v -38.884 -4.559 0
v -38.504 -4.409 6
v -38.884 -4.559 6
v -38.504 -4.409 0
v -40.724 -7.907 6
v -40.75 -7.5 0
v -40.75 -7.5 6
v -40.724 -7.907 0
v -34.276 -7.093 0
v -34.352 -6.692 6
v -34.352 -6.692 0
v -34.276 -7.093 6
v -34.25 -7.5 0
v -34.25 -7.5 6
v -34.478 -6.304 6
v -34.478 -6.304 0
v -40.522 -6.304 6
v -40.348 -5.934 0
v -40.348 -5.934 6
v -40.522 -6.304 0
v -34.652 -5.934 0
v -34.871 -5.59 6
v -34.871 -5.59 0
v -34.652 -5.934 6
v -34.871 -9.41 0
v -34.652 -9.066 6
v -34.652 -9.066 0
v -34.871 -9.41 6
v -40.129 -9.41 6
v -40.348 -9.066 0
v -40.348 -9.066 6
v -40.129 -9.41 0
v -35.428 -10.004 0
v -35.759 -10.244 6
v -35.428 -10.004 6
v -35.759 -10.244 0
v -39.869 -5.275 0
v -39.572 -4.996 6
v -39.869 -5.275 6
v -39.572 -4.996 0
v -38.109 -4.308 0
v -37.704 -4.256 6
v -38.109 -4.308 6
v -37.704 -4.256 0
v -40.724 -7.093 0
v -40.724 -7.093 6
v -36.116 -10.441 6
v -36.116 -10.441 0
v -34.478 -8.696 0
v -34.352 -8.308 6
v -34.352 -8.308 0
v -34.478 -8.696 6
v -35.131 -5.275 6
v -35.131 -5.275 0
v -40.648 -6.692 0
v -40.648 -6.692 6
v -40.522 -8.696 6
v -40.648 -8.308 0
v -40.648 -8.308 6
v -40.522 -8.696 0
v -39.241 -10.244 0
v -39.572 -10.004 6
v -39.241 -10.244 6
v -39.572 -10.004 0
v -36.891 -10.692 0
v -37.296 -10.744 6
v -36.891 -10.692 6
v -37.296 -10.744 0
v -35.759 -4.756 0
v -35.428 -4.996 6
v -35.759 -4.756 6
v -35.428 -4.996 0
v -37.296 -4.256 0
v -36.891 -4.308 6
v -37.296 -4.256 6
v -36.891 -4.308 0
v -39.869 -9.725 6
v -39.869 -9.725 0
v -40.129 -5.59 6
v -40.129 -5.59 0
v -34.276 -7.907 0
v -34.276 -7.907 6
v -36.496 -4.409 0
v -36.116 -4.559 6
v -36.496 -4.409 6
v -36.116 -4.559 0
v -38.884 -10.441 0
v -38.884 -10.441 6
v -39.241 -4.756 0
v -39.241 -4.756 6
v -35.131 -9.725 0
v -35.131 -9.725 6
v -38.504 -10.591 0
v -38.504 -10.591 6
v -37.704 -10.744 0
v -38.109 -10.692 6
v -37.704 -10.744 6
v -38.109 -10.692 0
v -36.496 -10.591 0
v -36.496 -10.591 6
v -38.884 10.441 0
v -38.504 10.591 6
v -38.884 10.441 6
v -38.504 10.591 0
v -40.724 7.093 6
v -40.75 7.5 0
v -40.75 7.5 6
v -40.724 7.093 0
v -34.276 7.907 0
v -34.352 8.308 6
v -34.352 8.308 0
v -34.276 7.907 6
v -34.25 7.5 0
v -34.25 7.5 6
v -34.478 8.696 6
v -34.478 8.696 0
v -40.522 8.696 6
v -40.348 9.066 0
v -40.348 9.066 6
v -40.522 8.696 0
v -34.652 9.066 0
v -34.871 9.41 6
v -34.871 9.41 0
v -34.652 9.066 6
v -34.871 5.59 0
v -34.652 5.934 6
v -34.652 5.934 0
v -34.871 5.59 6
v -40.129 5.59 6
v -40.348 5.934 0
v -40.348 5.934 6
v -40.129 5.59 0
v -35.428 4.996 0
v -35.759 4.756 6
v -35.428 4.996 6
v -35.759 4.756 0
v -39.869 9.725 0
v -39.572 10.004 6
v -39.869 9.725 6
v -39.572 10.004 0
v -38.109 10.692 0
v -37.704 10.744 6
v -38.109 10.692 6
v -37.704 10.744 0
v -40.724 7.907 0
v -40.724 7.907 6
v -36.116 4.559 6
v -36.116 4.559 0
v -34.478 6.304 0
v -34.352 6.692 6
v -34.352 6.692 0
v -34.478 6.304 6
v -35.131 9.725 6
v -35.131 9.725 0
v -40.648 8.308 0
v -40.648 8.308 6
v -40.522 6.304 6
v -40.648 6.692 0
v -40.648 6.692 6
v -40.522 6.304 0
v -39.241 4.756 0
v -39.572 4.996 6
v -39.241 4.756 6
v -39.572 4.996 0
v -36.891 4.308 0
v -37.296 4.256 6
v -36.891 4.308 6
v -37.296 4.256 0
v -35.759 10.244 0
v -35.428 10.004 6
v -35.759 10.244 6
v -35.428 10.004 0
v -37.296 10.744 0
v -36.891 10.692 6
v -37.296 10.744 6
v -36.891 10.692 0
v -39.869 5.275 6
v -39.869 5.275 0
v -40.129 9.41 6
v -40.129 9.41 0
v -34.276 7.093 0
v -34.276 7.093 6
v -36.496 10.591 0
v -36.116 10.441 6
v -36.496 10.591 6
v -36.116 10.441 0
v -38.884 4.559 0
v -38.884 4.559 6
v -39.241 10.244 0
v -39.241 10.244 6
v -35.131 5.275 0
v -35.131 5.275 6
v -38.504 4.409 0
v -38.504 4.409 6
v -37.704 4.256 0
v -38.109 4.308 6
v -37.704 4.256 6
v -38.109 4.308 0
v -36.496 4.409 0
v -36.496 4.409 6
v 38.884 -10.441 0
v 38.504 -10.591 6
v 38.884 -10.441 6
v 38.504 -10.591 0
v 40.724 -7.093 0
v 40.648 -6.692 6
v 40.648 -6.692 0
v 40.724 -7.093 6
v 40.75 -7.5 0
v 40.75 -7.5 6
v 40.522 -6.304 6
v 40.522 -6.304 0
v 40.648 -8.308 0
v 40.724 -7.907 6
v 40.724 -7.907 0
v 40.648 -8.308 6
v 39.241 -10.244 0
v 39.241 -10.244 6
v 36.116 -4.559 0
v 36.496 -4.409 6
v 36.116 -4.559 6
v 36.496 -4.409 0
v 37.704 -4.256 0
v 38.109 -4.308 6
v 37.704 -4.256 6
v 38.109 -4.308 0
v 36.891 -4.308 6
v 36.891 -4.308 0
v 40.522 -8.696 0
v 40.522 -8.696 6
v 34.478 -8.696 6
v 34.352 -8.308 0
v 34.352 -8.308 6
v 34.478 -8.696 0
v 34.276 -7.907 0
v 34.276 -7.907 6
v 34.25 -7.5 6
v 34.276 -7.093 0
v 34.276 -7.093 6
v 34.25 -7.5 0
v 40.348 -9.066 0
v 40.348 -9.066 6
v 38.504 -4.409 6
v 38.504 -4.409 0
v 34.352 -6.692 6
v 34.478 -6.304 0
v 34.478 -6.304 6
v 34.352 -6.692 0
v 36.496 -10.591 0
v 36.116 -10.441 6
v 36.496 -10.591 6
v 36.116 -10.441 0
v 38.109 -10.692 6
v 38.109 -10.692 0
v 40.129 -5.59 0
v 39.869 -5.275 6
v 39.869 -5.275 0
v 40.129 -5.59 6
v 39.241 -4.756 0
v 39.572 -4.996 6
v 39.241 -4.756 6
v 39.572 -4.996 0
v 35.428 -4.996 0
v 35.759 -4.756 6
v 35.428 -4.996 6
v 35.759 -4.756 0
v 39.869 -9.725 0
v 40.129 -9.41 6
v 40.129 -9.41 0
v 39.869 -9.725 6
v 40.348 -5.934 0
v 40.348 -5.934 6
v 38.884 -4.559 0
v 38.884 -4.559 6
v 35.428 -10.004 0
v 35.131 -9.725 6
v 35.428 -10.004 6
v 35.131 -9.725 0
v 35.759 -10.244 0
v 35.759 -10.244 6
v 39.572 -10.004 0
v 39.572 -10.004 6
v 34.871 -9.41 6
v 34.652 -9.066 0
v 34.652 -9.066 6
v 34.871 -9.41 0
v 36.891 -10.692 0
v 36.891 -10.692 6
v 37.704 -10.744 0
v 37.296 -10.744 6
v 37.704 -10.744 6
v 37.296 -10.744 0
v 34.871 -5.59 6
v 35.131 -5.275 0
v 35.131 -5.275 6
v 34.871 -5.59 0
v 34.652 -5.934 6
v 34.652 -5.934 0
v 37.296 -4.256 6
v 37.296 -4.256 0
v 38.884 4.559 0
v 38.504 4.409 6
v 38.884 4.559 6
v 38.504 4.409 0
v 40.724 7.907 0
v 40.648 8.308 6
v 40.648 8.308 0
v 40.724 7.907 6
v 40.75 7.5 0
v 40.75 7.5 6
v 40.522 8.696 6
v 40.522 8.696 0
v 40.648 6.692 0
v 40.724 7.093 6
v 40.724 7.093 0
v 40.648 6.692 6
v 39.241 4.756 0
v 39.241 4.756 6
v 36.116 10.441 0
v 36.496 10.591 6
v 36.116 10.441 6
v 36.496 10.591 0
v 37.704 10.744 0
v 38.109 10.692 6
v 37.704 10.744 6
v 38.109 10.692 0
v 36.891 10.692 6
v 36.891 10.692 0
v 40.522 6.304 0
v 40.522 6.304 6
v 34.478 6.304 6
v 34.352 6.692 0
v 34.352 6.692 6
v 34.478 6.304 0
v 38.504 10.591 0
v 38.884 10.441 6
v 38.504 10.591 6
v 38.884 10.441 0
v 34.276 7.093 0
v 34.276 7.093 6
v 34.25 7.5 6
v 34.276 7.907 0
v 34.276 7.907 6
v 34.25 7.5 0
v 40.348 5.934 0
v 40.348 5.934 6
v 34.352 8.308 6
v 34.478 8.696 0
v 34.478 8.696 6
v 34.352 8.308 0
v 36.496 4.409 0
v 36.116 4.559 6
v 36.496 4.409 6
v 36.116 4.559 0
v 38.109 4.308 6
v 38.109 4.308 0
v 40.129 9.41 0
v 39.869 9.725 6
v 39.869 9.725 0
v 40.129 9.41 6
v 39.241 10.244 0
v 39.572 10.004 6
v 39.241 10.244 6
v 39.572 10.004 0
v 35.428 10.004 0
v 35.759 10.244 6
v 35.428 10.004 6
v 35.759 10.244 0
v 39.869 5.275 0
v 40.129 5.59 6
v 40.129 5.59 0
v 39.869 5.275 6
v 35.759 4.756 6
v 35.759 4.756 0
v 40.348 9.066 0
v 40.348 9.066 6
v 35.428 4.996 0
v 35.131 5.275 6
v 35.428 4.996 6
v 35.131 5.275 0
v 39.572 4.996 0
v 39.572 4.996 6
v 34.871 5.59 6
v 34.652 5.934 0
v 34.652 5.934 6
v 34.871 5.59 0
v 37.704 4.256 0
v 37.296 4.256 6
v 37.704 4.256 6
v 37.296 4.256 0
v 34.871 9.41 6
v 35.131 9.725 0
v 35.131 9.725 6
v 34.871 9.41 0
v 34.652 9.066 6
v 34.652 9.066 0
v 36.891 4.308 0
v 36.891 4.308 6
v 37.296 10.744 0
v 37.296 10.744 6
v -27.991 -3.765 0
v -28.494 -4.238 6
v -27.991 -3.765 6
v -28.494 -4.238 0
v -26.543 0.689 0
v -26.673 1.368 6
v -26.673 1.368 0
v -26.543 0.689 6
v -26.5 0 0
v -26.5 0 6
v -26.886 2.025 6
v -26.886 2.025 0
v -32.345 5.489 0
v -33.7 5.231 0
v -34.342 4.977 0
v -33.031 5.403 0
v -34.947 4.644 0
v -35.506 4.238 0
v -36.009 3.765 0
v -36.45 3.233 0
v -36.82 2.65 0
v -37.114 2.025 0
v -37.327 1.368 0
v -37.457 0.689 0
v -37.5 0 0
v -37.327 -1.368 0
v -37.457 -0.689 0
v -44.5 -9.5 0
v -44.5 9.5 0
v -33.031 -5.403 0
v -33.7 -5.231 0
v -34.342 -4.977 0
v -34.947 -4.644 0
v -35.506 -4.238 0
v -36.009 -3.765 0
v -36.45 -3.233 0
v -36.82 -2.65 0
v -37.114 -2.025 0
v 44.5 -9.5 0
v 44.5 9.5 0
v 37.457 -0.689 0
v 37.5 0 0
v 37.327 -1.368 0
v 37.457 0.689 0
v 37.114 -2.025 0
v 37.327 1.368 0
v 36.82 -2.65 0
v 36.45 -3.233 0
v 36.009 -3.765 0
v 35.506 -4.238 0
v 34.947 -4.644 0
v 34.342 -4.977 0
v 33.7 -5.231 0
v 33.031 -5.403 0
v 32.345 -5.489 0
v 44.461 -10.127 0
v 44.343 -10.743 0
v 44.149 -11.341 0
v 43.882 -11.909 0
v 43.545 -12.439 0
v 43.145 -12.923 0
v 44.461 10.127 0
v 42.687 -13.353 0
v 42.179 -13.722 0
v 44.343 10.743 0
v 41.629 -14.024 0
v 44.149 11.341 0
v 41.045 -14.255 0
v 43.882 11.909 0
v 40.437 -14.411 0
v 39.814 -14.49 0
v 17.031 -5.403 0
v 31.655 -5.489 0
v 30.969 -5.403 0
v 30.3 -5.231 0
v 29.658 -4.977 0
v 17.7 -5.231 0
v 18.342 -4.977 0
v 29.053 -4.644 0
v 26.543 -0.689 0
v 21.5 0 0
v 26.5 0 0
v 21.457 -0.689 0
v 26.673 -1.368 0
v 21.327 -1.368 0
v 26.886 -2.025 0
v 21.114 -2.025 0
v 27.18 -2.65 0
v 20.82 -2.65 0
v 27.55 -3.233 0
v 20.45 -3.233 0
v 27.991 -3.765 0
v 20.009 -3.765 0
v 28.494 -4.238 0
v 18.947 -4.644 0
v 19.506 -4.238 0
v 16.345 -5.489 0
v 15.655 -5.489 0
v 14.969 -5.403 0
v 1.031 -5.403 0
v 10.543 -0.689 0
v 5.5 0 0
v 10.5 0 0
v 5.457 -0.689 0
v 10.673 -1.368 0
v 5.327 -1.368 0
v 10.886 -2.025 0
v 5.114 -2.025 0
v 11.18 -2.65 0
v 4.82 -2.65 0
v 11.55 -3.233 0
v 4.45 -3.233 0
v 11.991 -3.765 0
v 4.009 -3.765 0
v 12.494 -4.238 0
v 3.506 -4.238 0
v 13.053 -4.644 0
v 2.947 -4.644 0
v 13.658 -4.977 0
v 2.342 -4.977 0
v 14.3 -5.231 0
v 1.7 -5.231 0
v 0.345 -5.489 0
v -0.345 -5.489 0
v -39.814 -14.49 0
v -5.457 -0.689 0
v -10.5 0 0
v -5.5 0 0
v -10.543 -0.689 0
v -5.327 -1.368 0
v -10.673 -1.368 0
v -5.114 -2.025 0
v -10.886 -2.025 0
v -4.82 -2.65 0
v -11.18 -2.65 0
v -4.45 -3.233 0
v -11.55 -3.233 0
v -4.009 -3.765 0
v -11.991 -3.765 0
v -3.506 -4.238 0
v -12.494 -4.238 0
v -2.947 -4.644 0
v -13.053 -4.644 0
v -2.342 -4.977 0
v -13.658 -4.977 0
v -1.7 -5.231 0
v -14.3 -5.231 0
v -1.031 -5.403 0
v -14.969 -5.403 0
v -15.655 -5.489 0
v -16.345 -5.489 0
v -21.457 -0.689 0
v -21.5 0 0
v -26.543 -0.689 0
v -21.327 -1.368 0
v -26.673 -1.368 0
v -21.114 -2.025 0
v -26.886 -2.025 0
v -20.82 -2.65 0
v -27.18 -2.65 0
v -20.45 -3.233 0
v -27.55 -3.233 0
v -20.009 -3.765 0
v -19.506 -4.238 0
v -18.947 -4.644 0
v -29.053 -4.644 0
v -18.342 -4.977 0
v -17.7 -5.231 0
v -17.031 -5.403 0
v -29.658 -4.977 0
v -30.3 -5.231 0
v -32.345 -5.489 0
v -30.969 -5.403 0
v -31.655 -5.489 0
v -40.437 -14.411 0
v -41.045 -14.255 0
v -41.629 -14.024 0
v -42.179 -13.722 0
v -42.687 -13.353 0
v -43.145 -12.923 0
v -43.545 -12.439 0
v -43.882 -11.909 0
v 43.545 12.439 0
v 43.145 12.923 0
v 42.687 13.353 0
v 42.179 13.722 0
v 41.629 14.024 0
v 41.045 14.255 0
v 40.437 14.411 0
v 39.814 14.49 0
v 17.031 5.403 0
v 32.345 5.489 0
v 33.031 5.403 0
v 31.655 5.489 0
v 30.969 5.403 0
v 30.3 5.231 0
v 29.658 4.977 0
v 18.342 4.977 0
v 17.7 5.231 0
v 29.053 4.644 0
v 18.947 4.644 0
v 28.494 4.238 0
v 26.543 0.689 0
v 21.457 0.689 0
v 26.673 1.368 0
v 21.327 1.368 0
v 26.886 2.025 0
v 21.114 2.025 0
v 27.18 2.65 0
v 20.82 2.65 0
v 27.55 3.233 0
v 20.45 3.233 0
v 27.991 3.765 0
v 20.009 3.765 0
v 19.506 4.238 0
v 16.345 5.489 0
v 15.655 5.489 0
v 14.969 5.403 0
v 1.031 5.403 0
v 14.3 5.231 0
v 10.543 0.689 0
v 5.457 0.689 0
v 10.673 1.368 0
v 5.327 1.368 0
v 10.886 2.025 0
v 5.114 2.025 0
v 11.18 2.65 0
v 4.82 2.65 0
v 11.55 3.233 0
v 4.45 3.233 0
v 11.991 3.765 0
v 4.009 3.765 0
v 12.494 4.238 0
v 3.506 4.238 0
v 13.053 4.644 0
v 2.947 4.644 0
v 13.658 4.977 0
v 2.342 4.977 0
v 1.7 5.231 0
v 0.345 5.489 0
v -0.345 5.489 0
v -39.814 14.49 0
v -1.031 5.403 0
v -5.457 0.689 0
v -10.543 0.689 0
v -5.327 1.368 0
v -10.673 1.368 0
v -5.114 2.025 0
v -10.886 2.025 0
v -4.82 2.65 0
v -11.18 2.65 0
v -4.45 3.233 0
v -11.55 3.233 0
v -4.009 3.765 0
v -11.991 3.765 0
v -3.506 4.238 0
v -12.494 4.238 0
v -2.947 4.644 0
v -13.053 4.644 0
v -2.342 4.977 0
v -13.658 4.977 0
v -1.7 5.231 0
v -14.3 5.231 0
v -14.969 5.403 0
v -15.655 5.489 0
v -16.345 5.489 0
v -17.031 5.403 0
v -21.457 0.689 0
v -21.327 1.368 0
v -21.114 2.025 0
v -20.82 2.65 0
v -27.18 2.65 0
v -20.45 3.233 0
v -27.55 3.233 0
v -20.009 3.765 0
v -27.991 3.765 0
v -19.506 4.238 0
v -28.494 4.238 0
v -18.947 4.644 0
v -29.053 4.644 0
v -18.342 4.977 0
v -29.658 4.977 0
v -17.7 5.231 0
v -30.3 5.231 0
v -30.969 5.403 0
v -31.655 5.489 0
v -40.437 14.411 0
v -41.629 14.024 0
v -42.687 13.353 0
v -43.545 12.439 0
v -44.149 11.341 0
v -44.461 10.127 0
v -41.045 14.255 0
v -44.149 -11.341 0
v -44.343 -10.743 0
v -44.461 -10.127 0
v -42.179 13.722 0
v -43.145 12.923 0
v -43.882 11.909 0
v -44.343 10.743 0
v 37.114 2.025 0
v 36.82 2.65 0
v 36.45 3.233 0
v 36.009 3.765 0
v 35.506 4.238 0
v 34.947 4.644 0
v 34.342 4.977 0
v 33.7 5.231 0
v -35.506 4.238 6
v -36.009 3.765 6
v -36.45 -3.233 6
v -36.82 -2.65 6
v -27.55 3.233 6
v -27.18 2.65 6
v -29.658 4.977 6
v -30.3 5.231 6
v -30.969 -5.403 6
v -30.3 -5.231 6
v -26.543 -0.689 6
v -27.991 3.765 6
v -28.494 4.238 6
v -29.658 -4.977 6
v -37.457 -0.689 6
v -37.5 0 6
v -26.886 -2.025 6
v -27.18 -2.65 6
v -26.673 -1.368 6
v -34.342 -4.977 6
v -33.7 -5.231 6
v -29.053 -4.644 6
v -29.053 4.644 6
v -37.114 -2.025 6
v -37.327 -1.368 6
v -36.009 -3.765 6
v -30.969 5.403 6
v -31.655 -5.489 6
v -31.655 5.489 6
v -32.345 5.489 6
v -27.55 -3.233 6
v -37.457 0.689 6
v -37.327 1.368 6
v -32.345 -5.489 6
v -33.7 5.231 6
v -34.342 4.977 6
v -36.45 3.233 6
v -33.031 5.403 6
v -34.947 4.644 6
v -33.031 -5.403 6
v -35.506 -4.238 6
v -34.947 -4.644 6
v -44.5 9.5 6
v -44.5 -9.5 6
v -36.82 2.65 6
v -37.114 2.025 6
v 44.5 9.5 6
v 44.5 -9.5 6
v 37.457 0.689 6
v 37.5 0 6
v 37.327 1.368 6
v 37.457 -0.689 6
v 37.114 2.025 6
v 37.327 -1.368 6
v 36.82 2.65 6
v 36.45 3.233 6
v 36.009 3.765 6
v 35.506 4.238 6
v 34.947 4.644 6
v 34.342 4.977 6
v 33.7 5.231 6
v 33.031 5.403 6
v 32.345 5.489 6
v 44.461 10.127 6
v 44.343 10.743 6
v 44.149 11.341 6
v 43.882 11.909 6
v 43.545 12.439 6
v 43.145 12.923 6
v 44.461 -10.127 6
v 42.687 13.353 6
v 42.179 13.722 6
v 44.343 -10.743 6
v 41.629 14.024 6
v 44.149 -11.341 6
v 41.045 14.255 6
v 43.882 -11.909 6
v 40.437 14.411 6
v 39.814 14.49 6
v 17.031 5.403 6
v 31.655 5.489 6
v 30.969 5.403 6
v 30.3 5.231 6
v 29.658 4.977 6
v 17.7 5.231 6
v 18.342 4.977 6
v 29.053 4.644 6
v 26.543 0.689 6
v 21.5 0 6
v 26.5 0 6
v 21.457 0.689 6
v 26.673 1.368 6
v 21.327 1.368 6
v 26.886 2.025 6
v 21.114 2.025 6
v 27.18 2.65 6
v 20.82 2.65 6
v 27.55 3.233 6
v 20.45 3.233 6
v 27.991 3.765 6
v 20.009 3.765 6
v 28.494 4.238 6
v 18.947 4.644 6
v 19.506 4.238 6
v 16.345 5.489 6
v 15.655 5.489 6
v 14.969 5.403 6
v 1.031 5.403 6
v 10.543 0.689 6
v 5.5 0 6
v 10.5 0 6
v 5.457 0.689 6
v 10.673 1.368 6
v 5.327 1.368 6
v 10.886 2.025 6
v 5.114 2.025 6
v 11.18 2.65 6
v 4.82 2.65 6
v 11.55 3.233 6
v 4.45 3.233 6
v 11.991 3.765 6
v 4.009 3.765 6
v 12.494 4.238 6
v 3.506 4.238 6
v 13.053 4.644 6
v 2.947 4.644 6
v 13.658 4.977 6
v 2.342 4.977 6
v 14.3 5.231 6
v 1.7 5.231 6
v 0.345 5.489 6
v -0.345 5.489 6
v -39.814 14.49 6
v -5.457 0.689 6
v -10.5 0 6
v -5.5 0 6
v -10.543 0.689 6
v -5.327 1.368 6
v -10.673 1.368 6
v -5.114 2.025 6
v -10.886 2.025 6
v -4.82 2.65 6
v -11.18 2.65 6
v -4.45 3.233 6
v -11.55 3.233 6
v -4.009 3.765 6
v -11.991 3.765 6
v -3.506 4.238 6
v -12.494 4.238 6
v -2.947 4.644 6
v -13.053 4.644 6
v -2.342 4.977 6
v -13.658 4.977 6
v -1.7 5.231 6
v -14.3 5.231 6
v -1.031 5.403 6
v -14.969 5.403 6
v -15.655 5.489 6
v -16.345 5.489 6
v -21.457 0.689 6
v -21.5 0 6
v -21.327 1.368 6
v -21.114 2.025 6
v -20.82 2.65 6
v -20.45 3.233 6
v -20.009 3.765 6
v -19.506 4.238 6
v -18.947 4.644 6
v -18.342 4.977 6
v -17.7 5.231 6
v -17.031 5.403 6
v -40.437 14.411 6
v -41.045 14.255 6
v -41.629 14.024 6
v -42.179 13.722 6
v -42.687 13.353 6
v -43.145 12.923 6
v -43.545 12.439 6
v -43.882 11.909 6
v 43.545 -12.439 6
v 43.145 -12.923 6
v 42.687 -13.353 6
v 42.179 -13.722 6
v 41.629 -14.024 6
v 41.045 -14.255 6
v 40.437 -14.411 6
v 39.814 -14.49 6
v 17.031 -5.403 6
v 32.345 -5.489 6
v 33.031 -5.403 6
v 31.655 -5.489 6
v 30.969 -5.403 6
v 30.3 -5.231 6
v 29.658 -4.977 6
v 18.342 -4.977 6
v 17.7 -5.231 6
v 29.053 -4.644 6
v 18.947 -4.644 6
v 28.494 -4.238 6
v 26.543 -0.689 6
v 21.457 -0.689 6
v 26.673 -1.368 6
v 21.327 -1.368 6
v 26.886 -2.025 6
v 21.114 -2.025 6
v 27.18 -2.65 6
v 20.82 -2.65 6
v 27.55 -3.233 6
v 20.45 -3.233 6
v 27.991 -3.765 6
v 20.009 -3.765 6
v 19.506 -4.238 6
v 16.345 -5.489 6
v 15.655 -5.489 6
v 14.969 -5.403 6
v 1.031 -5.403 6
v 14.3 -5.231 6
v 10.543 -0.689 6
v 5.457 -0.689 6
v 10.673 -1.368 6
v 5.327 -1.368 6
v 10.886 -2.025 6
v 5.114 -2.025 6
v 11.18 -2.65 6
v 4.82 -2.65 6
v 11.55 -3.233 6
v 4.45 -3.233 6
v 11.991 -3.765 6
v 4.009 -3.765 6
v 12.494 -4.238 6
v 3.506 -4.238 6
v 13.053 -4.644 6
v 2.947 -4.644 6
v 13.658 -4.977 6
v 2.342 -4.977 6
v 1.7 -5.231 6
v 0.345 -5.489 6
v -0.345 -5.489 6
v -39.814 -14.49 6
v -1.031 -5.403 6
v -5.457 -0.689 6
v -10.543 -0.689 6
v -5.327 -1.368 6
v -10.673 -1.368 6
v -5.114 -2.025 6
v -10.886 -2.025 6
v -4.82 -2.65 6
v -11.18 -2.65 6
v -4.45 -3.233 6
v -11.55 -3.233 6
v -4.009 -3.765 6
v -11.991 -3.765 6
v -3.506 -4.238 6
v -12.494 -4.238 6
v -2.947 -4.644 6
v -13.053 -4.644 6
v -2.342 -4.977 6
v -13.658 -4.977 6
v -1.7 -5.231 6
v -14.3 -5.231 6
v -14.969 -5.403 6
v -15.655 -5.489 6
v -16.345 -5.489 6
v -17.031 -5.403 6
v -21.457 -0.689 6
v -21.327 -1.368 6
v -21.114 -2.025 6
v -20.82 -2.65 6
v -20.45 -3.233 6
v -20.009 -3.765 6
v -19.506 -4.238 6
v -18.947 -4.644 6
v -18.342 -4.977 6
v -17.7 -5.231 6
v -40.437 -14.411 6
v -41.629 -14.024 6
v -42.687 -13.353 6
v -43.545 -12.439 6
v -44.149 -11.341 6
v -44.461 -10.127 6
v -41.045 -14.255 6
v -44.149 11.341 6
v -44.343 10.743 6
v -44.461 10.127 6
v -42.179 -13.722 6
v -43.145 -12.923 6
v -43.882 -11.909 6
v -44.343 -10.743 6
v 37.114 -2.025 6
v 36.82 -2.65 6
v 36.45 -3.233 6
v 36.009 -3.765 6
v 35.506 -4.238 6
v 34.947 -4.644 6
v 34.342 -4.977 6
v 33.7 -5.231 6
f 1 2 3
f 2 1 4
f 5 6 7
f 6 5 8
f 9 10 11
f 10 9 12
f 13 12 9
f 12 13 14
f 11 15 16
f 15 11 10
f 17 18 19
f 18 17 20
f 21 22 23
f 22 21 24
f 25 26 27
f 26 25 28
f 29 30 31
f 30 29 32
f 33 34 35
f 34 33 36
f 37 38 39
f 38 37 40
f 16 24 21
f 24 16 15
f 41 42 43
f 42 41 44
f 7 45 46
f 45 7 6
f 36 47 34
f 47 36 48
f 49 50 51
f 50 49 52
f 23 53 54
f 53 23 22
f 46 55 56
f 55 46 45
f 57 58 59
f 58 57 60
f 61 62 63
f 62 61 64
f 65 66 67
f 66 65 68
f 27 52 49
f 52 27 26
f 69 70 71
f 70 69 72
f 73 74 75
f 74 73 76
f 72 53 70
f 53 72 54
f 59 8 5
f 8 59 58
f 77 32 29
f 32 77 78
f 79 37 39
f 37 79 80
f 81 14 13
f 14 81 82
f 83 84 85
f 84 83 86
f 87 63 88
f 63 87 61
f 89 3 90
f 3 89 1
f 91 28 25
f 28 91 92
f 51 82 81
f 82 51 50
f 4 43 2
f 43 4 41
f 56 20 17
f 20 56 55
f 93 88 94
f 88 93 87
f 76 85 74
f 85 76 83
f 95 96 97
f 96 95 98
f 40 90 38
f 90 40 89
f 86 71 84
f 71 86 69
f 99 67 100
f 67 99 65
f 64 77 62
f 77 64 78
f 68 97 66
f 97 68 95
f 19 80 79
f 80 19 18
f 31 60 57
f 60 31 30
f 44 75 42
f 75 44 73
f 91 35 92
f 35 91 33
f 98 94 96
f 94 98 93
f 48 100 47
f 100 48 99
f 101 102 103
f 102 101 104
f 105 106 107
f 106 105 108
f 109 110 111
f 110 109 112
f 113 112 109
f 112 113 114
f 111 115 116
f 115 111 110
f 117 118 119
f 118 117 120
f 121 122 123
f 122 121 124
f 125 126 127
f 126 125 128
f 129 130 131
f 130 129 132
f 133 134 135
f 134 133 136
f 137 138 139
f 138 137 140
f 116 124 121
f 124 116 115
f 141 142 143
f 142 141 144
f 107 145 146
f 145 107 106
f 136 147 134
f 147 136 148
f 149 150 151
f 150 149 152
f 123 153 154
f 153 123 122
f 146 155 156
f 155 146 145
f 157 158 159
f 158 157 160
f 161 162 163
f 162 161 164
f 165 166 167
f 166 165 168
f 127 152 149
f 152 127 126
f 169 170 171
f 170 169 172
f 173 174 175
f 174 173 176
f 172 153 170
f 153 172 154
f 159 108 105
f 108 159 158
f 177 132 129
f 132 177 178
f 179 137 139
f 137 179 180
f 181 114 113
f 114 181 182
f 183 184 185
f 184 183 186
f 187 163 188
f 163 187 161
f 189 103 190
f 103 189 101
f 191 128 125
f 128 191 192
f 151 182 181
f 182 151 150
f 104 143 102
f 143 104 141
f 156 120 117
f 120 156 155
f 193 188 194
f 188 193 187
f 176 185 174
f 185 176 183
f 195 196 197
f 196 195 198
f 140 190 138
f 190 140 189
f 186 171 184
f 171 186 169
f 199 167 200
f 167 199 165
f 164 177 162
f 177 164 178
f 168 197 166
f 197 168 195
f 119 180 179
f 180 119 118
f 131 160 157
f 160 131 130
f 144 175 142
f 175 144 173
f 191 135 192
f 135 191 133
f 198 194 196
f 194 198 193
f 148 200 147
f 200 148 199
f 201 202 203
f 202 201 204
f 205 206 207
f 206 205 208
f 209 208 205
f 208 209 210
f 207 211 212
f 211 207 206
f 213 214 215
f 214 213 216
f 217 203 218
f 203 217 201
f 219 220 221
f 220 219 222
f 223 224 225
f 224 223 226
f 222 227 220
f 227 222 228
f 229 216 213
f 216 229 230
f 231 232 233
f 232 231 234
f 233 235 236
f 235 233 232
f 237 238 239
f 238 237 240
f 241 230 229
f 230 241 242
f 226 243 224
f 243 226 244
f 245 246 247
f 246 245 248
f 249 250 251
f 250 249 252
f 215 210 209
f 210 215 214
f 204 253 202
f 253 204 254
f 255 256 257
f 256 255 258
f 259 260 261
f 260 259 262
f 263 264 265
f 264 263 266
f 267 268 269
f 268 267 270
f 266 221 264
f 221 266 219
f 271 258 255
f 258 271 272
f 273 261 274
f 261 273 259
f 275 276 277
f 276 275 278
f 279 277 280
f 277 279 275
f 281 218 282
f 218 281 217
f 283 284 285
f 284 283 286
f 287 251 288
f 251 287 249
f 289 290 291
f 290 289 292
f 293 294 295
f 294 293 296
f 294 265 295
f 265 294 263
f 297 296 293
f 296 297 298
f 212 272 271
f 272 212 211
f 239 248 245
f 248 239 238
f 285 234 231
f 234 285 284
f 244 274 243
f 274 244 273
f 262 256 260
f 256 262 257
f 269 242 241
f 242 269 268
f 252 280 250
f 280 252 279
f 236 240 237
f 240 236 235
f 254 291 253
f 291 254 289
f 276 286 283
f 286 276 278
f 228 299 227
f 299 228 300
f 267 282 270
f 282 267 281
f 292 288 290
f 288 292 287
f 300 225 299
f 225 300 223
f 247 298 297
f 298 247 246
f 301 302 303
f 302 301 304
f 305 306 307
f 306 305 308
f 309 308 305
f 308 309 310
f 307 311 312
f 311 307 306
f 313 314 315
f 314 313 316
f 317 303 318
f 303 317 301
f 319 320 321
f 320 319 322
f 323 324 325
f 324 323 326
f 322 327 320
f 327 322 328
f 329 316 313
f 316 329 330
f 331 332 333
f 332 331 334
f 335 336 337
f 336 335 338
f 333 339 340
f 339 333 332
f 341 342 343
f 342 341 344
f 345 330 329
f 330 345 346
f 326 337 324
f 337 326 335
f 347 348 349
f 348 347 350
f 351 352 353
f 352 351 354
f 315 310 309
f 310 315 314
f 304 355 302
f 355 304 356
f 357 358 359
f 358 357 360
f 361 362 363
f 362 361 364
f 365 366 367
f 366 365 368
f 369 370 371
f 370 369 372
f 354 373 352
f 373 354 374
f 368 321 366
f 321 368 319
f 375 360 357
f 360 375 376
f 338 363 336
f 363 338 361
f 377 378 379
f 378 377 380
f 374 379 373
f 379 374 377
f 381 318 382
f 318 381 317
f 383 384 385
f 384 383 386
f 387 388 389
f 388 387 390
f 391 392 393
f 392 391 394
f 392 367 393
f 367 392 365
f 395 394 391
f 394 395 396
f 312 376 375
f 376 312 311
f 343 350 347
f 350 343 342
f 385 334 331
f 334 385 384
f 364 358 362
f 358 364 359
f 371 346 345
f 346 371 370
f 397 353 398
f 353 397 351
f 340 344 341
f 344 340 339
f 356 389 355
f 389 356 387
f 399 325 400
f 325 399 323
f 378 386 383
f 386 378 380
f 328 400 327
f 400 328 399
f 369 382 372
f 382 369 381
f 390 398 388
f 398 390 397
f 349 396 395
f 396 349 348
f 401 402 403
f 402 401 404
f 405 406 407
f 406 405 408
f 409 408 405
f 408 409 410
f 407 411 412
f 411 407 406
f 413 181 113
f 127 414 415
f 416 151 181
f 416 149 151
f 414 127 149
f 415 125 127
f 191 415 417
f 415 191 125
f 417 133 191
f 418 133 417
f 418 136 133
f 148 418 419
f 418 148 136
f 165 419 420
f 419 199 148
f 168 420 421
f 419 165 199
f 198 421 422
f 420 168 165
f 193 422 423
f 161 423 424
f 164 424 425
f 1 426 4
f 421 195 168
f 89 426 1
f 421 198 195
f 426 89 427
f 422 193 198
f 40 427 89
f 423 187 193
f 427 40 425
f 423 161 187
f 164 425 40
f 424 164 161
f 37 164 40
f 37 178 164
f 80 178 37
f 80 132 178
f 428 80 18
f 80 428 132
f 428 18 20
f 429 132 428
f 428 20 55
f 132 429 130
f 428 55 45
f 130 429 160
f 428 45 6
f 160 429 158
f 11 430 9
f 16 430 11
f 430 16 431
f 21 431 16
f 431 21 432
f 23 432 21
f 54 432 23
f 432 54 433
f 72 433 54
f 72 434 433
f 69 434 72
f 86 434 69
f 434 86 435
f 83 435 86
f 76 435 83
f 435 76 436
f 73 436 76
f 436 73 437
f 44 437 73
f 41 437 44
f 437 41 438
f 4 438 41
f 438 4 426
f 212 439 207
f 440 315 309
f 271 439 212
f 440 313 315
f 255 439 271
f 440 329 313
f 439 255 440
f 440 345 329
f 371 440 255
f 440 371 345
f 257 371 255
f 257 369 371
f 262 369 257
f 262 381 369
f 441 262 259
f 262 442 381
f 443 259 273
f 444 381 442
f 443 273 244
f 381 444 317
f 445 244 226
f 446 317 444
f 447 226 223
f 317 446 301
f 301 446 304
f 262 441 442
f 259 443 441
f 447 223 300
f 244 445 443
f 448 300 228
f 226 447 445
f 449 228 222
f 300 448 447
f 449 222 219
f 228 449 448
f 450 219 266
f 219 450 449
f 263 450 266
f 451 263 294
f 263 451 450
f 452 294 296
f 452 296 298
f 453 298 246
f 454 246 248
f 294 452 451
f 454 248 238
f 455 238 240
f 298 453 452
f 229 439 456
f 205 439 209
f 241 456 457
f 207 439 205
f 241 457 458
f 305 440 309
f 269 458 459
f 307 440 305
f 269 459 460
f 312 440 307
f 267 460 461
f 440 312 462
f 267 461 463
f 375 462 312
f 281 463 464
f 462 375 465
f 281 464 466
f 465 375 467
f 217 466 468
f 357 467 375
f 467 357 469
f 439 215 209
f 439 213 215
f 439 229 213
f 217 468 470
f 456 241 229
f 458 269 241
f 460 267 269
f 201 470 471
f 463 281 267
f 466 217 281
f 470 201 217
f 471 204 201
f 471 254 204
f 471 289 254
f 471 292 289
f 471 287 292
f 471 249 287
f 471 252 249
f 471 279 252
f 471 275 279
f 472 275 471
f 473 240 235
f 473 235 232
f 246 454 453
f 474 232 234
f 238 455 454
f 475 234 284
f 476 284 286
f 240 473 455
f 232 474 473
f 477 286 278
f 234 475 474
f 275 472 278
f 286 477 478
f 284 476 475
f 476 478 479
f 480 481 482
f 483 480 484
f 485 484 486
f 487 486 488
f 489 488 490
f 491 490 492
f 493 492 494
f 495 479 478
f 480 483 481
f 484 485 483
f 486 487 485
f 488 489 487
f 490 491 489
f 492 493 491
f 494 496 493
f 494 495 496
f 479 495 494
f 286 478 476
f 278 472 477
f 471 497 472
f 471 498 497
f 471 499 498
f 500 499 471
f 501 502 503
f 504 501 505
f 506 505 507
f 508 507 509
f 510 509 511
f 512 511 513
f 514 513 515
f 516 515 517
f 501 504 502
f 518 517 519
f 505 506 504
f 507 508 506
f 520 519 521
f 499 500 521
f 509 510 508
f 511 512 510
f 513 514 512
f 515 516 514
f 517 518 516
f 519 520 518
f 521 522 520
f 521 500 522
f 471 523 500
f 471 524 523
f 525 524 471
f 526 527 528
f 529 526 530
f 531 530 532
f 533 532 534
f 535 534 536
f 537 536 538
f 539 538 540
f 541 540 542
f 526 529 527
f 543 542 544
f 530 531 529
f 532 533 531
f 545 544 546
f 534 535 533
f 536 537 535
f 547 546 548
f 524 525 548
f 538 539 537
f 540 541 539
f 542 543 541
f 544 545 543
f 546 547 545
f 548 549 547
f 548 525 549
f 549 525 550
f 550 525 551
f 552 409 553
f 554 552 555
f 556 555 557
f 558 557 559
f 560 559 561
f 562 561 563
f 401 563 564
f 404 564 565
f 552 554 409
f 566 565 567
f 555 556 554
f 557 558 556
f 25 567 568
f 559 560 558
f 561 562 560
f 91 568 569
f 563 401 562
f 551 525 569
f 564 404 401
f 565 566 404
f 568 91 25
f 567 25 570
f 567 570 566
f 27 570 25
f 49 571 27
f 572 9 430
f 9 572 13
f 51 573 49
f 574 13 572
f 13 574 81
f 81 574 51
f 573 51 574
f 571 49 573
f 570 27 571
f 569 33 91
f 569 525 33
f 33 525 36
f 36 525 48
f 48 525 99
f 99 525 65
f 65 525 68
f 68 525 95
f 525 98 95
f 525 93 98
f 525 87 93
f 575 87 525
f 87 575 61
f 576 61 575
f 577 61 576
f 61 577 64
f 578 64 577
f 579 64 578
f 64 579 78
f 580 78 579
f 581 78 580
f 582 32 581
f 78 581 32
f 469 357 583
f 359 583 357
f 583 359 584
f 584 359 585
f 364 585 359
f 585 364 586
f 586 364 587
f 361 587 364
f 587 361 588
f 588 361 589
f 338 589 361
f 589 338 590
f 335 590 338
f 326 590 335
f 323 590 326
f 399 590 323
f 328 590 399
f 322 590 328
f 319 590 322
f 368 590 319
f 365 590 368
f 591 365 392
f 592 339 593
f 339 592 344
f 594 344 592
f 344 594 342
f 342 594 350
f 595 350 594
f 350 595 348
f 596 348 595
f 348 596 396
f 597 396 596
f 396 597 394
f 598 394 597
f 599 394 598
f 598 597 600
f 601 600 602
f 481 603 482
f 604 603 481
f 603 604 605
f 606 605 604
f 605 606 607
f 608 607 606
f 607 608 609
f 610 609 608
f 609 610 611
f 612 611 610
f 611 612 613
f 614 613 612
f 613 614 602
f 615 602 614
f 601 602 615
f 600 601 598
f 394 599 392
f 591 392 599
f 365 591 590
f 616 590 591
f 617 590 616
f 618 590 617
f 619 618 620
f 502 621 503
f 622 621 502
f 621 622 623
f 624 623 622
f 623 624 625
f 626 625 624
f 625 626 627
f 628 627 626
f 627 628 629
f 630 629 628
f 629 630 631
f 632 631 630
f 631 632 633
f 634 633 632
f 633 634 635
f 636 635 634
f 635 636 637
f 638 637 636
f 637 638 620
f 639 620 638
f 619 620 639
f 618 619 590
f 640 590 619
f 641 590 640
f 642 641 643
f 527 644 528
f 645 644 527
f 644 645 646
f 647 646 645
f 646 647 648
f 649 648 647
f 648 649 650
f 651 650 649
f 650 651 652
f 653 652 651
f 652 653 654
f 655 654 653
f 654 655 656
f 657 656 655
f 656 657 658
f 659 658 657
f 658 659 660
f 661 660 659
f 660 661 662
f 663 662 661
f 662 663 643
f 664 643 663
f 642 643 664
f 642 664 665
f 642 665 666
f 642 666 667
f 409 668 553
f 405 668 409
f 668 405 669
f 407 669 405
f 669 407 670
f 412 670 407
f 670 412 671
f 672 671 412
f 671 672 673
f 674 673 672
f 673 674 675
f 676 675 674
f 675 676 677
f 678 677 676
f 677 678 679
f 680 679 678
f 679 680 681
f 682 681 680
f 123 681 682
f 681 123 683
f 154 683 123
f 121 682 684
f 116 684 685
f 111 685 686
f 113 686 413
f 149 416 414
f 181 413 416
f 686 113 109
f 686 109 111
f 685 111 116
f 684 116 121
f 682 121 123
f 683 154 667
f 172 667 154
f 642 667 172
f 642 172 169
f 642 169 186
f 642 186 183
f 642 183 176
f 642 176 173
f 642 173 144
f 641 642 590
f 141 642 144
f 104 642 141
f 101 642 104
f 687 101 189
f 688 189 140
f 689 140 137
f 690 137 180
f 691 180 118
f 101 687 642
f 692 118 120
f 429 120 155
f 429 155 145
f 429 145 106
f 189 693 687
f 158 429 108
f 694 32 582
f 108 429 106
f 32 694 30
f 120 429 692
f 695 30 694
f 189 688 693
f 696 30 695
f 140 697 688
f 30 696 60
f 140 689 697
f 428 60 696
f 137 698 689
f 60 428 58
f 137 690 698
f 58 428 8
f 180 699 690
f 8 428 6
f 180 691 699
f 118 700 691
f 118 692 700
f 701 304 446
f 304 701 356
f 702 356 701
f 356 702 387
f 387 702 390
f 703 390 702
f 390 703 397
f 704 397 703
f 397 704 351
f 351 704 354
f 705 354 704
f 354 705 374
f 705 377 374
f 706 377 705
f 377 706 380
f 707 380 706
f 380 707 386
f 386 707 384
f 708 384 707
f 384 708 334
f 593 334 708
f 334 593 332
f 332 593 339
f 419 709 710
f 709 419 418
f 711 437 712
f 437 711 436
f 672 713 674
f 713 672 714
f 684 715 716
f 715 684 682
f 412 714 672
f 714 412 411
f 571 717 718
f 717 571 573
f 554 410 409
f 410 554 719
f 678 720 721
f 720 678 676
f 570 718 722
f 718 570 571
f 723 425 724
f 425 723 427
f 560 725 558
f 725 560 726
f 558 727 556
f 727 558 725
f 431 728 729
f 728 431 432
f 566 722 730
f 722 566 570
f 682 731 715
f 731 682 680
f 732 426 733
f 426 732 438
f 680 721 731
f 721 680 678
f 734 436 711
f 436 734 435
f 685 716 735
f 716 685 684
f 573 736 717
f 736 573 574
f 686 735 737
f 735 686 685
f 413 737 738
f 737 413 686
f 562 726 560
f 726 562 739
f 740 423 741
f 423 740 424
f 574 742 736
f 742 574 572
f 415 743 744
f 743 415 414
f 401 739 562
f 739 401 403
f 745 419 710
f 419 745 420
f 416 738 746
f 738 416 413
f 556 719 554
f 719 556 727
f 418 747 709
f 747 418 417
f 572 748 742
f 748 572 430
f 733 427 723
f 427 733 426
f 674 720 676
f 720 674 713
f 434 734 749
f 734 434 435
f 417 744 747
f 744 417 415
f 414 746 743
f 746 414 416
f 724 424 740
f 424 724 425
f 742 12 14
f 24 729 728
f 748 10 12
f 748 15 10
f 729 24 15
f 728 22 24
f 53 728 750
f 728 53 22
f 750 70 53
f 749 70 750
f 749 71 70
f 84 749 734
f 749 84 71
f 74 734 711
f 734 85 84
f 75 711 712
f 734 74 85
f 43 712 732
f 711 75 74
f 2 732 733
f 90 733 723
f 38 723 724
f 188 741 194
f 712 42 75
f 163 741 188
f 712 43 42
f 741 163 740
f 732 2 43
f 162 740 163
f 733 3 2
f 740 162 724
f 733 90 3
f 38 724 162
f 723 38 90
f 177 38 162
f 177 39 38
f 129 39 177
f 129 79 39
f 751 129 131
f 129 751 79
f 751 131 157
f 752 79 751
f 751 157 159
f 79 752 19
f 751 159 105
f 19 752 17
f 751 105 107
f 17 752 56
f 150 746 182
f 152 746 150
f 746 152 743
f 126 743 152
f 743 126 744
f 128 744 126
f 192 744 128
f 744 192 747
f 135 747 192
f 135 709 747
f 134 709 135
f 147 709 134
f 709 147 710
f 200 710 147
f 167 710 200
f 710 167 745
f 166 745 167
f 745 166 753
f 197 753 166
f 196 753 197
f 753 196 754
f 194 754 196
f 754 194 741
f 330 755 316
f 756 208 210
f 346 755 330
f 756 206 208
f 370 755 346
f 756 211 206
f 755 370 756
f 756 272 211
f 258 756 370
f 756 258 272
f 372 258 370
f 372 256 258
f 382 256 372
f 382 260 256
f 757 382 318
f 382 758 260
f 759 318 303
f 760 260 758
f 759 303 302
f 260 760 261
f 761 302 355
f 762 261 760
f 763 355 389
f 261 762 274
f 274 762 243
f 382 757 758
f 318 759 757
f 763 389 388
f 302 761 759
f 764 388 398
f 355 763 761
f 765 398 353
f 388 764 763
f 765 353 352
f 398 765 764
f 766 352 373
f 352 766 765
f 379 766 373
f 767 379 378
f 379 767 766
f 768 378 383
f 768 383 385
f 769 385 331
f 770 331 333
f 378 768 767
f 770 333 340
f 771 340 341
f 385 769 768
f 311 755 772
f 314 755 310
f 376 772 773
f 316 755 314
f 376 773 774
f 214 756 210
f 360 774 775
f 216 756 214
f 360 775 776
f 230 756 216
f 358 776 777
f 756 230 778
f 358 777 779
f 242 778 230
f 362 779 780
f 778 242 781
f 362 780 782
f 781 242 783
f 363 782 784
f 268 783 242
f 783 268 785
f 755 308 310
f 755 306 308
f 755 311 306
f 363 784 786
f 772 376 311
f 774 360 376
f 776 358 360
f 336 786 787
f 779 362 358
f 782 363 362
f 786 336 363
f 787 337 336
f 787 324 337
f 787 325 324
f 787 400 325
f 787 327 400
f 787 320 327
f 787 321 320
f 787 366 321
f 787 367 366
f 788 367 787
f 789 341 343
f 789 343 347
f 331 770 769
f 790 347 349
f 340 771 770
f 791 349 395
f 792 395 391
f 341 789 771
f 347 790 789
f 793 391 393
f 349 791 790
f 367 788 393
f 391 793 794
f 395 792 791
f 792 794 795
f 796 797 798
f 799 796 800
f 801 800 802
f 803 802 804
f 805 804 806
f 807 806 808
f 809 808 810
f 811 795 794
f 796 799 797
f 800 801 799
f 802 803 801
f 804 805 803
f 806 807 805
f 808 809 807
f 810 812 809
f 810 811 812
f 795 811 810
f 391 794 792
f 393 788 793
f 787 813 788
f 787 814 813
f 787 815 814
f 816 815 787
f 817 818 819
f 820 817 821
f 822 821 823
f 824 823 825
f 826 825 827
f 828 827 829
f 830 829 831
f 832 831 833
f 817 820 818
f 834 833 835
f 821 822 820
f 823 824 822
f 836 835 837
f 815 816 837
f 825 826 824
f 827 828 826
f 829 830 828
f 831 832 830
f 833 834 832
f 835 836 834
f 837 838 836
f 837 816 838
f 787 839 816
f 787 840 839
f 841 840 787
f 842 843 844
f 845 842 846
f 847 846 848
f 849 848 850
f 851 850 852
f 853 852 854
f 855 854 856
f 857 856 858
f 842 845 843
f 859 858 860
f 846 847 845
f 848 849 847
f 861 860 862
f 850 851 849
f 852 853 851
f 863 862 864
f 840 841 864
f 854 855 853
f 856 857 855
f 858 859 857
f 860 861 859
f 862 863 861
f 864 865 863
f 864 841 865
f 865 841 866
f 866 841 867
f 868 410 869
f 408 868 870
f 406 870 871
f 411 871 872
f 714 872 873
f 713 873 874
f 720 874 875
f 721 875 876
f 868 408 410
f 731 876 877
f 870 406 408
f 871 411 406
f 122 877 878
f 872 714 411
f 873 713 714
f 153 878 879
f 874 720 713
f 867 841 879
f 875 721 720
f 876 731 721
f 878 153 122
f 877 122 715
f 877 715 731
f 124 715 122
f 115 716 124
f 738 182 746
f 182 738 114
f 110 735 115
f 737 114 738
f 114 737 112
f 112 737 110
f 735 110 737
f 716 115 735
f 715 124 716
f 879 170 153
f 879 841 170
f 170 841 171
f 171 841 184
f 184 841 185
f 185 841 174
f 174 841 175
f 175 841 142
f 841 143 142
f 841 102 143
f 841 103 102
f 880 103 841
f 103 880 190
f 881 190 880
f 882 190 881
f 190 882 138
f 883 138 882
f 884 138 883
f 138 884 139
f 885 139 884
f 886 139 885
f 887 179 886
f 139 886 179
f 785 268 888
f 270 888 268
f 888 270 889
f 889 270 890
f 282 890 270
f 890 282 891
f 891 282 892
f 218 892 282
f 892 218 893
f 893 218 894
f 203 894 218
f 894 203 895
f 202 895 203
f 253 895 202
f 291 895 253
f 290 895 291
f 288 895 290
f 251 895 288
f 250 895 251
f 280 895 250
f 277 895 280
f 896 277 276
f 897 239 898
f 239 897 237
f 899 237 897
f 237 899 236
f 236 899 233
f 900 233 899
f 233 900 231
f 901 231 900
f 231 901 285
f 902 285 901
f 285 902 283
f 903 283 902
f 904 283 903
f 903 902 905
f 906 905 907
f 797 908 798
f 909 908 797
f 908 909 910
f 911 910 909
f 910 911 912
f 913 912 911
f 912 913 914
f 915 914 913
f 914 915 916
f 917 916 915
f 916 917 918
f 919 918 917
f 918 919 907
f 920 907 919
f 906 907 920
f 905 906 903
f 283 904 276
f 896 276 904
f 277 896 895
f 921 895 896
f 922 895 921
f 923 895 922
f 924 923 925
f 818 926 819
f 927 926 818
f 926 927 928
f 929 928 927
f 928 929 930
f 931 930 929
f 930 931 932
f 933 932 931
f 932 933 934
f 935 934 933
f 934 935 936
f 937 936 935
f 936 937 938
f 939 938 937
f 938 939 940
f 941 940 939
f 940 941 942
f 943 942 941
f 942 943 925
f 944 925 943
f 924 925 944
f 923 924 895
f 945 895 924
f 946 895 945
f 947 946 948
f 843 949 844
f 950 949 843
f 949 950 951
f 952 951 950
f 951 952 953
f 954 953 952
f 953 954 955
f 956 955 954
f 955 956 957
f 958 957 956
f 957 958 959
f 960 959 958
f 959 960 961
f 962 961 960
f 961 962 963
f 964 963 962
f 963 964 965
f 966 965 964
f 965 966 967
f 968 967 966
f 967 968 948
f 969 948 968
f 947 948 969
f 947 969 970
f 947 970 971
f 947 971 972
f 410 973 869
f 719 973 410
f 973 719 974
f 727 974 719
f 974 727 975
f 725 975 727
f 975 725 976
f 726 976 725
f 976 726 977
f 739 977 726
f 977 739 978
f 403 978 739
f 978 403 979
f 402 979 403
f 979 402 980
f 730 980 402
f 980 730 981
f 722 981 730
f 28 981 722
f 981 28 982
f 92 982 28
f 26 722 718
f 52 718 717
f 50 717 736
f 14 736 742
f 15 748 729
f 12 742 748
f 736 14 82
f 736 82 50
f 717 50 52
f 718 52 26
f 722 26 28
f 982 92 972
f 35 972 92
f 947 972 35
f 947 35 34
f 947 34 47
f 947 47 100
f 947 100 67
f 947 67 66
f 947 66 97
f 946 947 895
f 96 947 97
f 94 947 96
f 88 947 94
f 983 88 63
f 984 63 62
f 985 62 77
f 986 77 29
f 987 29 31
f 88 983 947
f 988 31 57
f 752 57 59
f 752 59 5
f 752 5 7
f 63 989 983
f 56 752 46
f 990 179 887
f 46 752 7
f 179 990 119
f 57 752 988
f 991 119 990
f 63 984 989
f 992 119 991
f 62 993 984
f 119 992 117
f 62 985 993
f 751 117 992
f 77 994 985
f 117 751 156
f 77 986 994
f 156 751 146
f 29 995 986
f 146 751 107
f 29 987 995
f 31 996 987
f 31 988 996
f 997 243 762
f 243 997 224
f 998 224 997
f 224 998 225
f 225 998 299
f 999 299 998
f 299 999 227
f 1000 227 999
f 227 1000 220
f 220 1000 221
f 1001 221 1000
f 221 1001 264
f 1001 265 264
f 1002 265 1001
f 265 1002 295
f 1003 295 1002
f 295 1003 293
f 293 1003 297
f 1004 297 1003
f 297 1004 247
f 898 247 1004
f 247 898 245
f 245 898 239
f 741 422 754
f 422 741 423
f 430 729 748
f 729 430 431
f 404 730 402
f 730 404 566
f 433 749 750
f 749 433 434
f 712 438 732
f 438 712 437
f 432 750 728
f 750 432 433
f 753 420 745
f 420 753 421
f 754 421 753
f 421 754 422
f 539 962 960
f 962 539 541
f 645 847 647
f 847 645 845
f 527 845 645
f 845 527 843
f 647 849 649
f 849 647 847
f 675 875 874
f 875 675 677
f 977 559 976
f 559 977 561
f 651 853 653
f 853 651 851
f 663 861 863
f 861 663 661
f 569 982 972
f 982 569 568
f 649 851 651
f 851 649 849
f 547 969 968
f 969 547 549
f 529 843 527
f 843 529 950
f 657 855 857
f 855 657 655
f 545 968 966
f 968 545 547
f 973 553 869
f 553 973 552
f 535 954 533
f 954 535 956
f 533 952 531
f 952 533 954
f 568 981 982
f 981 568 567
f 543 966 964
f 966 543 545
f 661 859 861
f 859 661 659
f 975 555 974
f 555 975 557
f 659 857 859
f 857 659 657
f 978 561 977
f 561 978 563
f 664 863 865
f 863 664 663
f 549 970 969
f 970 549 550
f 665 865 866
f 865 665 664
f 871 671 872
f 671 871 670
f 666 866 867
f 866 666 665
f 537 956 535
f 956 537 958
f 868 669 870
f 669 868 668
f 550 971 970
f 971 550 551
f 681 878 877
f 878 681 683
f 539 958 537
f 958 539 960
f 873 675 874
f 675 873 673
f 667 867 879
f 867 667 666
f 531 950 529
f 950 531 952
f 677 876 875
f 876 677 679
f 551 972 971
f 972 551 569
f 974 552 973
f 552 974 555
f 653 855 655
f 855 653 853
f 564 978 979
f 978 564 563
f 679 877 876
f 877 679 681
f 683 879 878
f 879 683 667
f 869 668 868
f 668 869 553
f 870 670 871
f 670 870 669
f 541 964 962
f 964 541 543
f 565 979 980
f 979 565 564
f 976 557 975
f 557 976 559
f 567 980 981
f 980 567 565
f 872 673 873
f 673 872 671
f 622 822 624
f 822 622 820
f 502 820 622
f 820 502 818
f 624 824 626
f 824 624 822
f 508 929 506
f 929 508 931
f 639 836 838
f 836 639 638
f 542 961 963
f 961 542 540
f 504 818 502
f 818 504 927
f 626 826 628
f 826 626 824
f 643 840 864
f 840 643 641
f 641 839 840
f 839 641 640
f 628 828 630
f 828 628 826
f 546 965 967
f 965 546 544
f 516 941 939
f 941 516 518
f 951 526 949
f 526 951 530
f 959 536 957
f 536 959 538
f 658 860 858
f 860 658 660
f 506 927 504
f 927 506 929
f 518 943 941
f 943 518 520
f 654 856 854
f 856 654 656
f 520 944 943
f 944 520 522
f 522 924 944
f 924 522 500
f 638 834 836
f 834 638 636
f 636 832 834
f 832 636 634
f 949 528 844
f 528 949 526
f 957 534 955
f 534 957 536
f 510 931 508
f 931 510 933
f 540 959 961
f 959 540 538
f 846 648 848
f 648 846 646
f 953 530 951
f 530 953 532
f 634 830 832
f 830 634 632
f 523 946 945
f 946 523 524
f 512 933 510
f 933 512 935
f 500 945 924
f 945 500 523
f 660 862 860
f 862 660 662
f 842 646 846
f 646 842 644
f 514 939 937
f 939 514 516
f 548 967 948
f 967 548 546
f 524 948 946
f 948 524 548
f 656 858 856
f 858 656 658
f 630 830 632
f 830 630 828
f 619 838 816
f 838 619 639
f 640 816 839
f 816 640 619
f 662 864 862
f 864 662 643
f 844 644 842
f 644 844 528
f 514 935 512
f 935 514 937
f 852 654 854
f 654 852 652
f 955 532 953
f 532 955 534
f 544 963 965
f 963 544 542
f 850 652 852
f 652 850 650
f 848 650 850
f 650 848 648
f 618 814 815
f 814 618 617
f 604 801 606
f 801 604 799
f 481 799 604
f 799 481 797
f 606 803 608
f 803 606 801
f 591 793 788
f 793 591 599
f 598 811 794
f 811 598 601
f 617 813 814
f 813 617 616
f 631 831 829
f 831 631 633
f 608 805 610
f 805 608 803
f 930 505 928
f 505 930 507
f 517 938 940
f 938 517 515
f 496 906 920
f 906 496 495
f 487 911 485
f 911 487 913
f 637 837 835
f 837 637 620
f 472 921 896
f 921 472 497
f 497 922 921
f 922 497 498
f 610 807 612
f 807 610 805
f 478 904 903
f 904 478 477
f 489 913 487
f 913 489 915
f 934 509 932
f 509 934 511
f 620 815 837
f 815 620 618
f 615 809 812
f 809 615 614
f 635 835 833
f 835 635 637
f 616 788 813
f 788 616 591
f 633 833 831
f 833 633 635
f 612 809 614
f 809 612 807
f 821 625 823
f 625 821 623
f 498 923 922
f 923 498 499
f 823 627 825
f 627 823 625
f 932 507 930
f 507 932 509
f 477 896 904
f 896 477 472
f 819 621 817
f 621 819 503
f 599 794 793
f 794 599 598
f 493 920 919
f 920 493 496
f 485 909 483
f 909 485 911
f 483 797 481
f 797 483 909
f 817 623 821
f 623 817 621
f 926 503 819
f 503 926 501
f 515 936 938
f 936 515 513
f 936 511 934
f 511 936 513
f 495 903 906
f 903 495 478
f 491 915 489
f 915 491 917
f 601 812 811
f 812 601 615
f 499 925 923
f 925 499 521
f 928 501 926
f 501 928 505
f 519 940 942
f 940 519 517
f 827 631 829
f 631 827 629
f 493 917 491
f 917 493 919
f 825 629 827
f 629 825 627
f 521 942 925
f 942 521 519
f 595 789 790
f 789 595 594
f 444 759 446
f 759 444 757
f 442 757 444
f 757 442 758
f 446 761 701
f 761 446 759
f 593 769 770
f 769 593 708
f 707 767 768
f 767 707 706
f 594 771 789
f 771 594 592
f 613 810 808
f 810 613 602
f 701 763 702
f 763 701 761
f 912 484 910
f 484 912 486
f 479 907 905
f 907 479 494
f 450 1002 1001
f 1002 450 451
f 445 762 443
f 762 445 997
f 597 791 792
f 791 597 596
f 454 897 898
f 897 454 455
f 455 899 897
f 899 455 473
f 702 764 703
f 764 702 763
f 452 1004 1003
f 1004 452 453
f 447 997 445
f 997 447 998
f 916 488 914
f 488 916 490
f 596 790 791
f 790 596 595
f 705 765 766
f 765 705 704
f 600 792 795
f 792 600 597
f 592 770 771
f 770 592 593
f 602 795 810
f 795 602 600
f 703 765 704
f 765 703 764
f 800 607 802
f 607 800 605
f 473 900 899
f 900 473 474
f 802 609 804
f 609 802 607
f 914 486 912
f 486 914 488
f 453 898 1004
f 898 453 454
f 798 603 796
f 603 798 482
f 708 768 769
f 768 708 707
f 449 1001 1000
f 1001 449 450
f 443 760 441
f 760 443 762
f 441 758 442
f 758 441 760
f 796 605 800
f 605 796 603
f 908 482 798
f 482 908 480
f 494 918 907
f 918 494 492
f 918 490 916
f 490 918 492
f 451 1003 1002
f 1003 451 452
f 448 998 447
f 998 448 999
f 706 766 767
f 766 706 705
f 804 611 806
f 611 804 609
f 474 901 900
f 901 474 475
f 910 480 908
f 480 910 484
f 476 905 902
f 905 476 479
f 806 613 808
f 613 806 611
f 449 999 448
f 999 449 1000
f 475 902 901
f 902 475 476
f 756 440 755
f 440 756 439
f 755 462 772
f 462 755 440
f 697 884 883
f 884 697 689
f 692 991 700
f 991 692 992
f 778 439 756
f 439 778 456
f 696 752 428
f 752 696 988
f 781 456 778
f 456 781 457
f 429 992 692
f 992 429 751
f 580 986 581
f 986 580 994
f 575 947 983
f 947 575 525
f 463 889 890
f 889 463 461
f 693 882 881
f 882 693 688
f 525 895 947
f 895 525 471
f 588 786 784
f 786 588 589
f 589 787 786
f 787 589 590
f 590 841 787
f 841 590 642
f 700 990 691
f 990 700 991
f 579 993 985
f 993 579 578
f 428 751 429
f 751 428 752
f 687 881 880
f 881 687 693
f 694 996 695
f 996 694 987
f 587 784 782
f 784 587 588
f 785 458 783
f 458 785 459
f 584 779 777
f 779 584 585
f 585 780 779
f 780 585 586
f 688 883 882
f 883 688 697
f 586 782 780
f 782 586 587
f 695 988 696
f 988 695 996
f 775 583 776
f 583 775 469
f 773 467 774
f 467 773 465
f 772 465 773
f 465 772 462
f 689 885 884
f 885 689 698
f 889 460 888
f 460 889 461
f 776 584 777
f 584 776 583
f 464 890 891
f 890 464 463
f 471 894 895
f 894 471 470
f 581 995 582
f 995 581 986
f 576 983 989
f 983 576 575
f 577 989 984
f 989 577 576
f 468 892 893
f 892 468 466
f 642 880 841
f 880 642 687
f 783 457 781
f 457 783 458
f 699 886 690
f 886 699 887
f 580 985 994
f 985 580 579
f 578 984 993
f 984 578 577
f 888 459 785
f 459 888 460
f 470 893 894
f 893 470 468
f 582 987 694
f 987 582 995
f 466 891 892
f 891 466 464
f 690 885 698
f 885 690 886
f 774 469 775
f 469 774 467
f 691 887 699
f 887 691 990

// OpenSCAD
$fn = 50;

difference() {
	union() {
		hull() {
			translate(v = [-39.5, 9.5, 0]) {
				cylinder(h = 6, r = 5);
			}
			translate(v = [39.5, 9.5, 0]) {
				cylinder(h = 6, r = 5);
			}
			translate(v = [-39.5, -9.5, 0]) {
				cylinder(h = 6, r = 5);
			}
			translate(v = [39.5, -9.5, 0]) {
				cylinder(h = 6, r = 5);
			}
		}
	}
	union() {
		translate(v = [-37.5, -7.5, -100.0]) {
			cylinder(h = 200, r = 3.25);
		}
		translate(v = [-37.5, 7.5, -100.0]) {
			cylinder(h = 200, r = 3.25);
		}
		translate(v = [37.5, -7.5, -100.0]) {
			cylinder(h = 200, r = 3.25);
		}
		translate(v = [37.5, 7.5, -100.0]) {
			cylinder(h = 200, r = 3.25);
		}
		translate(v = [-37.5, -7.5, -100.0]) {
			cylinder(h = 200, r = 1.8);
		}
		translate(v = [-37.5, 7.5, -100.0]) {
			cylinder(h = 200, r = 1.8);
		}
		translate(v = [37.5, -7.5, -100.0]) {
			cylinder(h = 200, r = 1.8);
		}
		translate(v = [37.5, 7.5, -100.0]) {
			cylinder(h = 200, r = 1.8);
		}
		translate(v = [-32.0, 0, 0.0]) {
			cylinder(h = 6, r = 5.5);
		}
		translate(v = [-16.0, 0, 0.0]) {
			cylinder(h = 6, r = 5.5);
		}
		cylinder(h = 6, r = 5.5);
		translate(v = [16.0, 0, 0.0]) {
			cylinder(h = 6, r = 5.5);
		}
		translate(v = [32.0, 0, 0.0]) {
			cylinder(h = 6, r = 5.5);
		}
	}
}
